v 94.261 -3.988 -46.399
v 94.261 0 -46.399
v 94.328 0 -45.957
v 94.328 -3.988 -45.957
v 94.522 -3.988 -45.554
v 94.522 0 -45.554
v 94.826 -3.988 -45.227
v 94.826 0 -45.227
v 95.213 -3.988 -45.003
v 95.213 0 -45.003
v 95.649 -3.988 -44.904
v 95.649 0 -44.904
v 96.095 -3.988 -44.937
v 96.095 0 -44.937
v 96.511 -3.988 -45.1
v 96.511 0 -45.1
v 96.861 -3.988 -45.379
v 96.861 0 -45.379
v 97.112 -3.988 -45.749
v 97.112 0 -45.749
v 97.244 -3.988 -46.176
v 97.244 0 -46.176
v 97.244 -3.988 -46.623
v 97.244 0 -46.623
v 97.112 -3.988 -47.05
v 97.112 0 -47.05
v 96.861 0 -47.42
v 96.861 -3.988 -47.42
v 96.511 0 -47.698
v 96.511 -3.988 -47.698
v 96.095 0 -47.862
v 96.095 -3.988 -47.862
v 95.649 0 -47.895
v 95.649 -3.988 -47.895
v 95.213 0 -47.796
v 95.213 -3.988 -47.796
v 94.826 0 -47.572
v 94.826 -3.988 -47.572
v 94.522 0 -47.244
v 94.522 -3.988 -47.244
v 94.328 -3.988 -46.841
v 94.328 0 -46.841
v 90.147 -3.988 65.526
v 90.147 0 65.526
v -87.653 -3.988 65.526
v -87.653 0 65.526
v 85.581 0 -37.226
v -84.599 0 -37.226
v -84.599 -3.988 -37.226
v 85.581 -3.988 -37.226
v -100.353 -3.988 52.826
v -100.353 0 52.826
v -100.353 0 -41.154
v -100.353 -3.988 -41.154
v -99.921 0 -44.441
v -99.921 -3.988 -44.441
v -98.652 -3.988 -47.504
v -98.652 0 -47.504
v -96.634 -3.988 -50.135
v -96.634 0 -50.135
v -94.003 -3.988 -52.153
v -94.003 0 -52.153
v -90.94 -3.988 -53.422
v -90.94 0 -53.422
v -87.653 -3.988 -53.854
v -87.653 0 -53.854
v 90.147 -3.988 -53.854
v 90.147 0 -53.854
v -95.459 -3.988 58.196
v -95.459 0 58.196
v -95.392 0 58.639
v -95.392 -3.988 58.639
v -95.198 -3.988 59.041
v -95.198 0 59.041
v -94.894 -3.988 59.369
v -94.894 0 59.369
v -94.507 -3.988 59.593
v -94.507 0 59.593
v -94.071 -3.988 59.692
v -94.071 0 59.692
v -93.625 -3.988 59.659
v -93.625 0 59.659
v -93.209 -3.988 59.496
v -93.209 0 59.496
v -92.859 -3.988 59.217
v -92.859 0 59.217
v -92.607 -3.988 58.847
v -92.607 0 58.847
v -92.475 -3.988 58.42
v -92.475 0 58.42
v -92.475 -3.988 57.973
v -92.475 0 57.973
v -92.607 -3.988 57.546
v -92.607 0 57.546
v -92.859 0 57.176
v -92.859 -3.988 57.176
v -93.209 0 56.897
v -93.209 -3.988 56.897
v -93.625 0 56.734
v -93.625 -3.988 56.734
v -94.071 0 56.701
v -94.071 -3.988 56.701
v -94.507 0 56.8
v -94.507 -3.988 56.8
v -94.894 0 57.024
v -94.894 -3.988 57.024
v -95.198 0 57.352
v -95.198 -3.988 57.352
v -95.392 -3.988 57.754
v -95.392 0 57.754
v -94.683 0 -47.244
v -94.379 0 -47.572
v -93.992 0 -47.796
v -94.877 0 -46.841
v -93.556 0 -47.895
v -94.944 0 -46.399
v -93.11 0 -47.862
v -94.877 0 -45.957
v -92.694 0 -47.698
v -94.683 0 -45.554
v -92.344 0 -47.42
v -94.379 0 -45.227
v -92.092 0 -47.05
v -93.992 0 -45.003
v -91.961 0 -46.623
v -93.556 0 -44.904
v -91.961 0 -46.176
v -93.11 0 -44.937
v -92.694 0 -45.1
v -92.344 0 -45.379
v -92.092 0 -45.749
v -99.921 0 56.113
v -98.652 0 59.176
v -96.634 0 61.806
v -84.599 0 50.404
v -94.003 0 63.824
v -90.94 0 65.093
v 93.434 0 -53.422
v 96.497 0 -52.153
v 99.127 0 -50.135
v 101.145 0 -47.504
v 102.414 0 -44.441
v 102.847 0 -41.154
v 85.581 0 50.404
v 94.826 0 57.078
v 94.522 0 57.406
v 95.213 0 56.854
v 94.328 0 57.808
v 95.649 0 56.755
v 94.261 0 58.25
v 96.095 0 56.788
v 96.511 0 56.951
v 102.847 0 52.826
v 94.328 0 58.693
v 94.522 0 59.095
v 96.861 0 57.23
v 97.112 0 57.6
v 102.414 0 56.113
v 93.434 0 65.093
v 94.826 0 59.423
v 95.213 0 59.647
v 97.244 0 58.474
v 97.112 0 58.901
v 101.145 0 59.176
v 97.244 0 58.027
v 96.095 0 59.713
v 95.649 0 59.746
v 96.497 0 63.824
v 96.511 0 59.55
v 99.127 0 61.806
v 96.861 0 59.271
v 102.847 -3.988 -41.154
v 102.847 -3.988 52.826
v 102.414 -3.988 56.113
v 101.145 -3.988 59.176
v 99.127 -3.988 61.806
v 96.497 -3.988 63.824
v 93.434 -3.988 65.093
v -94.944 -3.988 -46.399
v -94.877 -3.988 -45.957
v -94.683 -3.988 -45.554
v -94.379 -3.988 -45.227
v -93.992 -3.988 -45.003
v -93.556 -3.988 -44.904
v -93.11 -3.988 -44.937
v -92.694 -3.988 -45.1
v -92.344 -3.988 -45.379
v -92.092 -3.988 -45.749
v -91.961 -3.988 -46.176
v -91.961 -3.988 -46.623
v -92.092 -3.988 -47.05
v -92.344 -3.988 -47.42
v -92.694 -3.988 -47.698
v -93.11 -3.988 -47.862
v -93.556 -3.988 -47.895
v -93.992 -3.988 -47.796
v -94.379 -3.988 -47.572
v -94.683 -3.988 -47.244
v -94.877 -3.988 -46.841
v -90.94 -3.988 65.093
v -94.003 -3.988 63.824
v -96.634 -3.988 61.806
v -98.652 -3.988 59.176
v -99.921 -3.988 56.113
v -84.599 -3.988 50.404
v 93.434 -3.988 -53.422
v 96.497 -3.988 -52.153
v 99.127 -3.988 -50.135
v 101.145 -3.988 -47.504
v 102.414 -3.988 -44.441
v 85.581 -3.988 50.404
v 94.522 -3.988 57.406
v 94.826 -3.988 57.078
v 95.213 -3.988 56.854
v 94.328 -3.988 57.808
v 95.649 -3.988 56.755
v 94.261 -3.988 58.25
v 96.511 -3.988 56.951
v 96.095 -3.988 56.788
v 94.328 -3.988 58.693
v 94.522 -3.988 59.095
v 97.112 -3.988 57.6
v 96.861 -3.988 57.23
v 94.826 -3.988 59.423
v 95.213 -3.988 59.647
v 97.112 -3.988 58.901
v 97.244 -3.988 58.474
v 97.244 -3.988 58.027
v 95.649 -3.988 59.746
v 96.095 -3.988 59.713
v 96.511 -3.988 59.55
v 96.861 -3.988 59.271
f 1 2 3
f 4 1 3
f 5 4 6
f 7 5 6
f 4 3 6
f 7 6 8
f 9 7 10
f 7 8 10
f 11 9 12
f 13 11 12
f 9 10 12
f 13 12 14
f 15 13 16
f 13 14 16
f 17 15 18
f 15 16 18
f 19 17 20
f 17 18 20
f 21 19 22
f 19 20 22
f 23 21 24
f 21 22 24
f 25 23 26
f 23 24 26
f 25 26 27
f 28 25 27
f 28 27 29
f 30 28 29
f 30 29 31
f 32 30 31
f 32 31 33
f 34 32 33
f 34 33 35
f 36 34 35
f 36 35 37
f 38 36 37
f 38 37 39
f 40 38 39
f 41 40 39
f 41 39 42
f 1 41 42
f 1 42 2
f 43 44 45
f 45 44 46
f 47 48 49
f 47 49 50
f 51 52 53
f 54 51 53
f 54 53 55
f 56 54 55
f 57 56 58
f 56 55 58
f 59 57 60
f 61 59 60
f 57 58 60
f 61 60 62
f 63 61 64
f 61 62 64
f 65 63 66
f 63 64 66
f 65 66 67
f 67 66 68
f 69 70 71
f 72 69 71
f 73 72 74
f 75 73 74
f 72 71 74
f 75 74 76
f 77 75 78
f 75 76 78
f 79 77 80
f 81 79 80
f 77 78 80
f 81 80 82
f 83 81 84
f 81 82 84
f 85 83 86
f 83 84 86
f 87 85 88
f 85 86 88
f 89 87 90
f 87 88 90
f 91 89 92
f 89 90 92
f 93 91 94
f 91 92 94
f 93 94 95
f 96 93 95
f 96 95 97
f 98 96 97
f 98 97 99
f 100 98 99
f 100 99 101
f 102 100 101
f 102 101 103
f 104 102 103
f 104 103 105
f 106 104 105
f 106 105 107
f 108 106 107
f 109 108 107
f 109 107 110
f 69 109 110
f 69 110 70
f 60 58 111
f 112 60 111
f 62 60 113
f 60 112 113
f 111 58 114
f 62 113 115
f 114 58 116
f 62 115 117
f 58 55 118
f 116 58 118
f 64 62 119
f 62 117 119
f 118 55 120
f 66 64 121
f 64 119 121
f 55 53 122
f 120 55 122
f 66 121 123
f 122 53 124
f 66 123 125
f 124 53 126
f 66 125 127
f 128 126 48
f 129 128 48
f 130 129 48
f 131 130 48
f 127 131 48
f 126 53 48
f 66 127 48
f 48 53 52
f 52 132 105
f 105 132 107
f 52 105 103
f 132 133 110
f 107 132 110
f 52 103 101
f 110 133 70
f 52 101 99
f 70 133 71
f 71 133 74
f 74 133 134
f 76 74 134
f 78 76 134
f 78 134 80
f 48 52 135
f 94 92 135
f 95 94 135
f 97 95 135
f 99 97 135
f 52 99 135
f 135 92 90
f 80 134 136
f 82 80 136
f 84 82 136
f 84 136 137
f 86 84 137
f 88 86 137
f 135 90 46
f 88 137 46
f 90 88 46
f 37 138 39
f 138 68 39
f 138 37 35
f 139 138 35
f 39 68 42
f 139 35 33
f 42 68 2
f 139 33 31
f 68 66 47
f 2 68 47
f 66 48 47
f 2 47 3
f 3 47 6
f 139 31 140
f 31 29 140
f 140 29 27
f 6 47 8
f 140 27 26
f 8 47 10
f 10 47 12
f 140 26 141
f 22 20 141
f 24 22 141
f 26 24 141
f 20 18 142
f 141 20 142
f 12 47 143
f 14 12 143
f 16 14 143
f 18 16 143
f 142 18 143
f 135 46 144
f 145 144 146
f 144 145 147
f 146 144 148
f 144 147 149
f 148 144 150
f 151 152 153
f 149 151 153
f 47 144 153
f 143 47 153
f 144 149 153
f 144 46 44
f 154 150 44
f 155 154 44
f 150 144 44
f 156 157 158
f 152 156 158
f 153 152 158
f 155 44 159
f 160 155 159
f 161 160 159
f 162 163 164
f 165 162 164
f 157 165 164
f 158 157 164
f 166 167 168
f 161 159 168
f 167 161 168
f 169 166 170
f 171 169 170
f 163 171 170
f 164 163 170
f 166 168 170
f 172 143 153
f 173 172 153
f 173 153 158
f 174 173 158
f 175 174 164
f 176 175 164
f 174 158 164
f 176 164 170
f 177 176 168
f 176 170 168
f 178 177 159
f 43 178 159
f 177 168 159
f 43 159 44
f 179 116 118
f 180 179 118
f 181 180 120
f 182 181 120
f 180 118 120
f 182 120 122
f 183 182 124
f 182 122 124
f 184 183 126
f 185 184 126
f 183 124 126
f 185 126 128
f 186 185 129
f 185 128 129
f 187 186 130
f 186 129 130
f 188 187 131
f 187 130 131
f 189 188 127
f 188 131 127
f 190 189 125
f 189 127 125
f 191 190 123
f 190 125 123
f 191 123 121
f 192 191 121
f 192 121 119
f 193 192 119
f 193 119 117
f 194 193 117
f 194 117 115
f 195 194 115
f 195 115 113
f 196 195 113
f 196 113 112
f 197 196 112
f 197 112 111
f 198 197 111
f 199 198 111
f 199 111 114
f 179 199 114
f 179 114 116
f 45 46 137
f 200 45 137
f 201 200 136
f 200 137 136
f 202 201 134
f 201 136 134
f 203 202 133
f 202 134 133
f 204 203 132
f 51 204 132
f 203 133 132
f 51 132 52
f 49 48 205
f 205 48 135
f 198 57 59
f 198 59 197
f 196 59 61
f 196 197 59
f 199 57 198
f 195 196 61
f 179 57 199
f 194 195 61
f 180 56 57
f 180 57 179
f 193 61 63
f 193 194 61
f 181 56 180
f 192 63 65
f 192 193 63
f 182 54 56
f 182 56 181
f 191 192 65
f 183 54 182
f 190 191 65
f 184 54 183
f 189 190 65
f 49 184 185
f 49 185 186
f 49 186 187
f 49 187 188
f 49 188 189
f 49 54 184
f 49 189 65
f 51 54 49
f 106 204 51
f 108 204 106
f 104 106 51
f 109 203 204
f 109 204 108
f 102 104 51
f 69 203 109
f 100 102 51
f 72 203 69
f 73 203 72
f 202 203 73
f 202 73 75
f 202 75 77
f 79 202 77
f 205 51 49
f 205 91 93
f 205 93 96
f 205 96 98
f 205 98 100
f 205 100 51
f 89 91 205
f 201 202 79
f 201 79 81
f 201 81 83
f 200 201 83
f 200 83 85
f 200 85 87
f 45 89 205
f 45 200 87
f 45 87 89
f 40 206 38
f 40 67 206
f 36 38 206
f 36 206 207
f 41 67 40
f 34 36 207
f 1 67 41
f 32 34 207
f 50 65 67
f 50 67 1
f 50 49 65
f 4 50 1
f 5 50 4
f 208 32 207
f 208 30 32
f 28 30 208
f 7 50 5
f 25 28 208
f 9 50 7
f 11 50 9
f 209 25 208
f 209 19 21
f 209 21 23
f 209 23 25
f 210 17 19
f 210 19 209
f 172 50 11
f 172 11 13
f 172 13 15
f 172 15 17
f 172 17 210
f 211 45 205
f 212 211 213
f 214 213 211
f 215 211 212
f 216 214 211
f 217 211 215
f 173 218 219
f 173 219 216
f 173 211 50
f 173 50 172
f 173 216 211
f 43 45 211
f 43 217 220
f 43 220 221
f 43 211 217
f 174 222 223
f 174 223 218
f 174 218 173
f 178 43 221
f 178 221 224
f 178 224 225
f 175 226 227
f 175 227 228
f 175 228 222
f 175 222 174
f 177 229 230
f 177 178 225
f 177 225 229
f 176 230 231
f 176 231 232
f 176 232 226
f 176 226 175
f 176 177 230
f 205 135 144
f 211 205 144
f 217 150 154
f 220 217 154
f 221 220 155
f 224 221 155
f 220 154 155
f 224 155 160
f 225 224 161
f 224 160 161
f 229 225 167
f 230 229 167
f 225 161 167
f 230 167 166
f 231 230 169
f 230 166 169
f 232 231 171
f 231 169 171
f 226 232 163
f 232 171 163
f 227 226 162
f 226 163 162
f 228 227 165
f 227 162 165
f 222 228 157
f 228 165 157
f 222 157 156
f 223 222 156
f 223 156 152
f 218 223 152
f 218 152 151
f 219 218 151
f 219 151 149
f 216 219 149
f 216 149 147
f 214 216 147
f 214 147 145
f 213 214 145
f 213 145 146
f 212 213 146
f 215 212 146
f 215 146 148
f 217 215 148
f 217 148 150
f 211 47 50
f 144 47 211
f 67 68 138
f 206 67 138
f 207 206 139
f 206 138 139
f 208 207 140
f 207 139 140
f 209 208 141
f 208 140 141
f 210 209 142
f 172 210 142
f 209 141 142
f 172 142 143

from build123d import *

# Parameters (mm, degrees)
F0_W     = 170.18
F0_H     = 87.63
F1_DEPTH = 3.9878
F3_D     = 3


with BuildPart() as f1:
    # F0 (on Front) → F1 (new body)
    with BuildSketch(Plane.XZ):
        with BuildLine():
            Line((90.146613, 65.525748), (-87.653387, 65.525748))
            ThreePointArc((-87.653387, 65.525748), (-96.633644, 61.806004), (-100.353387, 52.825748))
            Line((-100.353387, 52.825748), (-100.353387, -41.154252))
            ThreePointArc((-100.353387, -41.154252), (-96.633644, -50.134508), (-87.653387, -53.854252))
            Line((-87.653387, -53.854252), (90.146613, -53.854252))
            ThreePointArc((90.146613, -53.854252), (99.126869, -50.134508), (102.846613, -41.154252))
            Line((102.846613, -41.154252), (102.846613, 52.825748))
            ThreePointArc((102.846613, 52.825748), (99.126869, 61.806004), (90.146613, 65.525748))
        make_face()
        with Locations((0.491043, 6.588873)):
            Rectangle(F0_W, F0_H, mode=Mode.SUBTRACT)
    extrude(amount=F1_DEPTH)

    # F3 (through all)
    with Locations(Plane.XZ.offset(3.9878)):
        with Locations((-93.95866, 58.1965), (95.760956, 58.250498), (95.760956, -46.399333), (-93.443841, -46.399333)):
            Hole(F3_D / 2)


solid = f1.part
